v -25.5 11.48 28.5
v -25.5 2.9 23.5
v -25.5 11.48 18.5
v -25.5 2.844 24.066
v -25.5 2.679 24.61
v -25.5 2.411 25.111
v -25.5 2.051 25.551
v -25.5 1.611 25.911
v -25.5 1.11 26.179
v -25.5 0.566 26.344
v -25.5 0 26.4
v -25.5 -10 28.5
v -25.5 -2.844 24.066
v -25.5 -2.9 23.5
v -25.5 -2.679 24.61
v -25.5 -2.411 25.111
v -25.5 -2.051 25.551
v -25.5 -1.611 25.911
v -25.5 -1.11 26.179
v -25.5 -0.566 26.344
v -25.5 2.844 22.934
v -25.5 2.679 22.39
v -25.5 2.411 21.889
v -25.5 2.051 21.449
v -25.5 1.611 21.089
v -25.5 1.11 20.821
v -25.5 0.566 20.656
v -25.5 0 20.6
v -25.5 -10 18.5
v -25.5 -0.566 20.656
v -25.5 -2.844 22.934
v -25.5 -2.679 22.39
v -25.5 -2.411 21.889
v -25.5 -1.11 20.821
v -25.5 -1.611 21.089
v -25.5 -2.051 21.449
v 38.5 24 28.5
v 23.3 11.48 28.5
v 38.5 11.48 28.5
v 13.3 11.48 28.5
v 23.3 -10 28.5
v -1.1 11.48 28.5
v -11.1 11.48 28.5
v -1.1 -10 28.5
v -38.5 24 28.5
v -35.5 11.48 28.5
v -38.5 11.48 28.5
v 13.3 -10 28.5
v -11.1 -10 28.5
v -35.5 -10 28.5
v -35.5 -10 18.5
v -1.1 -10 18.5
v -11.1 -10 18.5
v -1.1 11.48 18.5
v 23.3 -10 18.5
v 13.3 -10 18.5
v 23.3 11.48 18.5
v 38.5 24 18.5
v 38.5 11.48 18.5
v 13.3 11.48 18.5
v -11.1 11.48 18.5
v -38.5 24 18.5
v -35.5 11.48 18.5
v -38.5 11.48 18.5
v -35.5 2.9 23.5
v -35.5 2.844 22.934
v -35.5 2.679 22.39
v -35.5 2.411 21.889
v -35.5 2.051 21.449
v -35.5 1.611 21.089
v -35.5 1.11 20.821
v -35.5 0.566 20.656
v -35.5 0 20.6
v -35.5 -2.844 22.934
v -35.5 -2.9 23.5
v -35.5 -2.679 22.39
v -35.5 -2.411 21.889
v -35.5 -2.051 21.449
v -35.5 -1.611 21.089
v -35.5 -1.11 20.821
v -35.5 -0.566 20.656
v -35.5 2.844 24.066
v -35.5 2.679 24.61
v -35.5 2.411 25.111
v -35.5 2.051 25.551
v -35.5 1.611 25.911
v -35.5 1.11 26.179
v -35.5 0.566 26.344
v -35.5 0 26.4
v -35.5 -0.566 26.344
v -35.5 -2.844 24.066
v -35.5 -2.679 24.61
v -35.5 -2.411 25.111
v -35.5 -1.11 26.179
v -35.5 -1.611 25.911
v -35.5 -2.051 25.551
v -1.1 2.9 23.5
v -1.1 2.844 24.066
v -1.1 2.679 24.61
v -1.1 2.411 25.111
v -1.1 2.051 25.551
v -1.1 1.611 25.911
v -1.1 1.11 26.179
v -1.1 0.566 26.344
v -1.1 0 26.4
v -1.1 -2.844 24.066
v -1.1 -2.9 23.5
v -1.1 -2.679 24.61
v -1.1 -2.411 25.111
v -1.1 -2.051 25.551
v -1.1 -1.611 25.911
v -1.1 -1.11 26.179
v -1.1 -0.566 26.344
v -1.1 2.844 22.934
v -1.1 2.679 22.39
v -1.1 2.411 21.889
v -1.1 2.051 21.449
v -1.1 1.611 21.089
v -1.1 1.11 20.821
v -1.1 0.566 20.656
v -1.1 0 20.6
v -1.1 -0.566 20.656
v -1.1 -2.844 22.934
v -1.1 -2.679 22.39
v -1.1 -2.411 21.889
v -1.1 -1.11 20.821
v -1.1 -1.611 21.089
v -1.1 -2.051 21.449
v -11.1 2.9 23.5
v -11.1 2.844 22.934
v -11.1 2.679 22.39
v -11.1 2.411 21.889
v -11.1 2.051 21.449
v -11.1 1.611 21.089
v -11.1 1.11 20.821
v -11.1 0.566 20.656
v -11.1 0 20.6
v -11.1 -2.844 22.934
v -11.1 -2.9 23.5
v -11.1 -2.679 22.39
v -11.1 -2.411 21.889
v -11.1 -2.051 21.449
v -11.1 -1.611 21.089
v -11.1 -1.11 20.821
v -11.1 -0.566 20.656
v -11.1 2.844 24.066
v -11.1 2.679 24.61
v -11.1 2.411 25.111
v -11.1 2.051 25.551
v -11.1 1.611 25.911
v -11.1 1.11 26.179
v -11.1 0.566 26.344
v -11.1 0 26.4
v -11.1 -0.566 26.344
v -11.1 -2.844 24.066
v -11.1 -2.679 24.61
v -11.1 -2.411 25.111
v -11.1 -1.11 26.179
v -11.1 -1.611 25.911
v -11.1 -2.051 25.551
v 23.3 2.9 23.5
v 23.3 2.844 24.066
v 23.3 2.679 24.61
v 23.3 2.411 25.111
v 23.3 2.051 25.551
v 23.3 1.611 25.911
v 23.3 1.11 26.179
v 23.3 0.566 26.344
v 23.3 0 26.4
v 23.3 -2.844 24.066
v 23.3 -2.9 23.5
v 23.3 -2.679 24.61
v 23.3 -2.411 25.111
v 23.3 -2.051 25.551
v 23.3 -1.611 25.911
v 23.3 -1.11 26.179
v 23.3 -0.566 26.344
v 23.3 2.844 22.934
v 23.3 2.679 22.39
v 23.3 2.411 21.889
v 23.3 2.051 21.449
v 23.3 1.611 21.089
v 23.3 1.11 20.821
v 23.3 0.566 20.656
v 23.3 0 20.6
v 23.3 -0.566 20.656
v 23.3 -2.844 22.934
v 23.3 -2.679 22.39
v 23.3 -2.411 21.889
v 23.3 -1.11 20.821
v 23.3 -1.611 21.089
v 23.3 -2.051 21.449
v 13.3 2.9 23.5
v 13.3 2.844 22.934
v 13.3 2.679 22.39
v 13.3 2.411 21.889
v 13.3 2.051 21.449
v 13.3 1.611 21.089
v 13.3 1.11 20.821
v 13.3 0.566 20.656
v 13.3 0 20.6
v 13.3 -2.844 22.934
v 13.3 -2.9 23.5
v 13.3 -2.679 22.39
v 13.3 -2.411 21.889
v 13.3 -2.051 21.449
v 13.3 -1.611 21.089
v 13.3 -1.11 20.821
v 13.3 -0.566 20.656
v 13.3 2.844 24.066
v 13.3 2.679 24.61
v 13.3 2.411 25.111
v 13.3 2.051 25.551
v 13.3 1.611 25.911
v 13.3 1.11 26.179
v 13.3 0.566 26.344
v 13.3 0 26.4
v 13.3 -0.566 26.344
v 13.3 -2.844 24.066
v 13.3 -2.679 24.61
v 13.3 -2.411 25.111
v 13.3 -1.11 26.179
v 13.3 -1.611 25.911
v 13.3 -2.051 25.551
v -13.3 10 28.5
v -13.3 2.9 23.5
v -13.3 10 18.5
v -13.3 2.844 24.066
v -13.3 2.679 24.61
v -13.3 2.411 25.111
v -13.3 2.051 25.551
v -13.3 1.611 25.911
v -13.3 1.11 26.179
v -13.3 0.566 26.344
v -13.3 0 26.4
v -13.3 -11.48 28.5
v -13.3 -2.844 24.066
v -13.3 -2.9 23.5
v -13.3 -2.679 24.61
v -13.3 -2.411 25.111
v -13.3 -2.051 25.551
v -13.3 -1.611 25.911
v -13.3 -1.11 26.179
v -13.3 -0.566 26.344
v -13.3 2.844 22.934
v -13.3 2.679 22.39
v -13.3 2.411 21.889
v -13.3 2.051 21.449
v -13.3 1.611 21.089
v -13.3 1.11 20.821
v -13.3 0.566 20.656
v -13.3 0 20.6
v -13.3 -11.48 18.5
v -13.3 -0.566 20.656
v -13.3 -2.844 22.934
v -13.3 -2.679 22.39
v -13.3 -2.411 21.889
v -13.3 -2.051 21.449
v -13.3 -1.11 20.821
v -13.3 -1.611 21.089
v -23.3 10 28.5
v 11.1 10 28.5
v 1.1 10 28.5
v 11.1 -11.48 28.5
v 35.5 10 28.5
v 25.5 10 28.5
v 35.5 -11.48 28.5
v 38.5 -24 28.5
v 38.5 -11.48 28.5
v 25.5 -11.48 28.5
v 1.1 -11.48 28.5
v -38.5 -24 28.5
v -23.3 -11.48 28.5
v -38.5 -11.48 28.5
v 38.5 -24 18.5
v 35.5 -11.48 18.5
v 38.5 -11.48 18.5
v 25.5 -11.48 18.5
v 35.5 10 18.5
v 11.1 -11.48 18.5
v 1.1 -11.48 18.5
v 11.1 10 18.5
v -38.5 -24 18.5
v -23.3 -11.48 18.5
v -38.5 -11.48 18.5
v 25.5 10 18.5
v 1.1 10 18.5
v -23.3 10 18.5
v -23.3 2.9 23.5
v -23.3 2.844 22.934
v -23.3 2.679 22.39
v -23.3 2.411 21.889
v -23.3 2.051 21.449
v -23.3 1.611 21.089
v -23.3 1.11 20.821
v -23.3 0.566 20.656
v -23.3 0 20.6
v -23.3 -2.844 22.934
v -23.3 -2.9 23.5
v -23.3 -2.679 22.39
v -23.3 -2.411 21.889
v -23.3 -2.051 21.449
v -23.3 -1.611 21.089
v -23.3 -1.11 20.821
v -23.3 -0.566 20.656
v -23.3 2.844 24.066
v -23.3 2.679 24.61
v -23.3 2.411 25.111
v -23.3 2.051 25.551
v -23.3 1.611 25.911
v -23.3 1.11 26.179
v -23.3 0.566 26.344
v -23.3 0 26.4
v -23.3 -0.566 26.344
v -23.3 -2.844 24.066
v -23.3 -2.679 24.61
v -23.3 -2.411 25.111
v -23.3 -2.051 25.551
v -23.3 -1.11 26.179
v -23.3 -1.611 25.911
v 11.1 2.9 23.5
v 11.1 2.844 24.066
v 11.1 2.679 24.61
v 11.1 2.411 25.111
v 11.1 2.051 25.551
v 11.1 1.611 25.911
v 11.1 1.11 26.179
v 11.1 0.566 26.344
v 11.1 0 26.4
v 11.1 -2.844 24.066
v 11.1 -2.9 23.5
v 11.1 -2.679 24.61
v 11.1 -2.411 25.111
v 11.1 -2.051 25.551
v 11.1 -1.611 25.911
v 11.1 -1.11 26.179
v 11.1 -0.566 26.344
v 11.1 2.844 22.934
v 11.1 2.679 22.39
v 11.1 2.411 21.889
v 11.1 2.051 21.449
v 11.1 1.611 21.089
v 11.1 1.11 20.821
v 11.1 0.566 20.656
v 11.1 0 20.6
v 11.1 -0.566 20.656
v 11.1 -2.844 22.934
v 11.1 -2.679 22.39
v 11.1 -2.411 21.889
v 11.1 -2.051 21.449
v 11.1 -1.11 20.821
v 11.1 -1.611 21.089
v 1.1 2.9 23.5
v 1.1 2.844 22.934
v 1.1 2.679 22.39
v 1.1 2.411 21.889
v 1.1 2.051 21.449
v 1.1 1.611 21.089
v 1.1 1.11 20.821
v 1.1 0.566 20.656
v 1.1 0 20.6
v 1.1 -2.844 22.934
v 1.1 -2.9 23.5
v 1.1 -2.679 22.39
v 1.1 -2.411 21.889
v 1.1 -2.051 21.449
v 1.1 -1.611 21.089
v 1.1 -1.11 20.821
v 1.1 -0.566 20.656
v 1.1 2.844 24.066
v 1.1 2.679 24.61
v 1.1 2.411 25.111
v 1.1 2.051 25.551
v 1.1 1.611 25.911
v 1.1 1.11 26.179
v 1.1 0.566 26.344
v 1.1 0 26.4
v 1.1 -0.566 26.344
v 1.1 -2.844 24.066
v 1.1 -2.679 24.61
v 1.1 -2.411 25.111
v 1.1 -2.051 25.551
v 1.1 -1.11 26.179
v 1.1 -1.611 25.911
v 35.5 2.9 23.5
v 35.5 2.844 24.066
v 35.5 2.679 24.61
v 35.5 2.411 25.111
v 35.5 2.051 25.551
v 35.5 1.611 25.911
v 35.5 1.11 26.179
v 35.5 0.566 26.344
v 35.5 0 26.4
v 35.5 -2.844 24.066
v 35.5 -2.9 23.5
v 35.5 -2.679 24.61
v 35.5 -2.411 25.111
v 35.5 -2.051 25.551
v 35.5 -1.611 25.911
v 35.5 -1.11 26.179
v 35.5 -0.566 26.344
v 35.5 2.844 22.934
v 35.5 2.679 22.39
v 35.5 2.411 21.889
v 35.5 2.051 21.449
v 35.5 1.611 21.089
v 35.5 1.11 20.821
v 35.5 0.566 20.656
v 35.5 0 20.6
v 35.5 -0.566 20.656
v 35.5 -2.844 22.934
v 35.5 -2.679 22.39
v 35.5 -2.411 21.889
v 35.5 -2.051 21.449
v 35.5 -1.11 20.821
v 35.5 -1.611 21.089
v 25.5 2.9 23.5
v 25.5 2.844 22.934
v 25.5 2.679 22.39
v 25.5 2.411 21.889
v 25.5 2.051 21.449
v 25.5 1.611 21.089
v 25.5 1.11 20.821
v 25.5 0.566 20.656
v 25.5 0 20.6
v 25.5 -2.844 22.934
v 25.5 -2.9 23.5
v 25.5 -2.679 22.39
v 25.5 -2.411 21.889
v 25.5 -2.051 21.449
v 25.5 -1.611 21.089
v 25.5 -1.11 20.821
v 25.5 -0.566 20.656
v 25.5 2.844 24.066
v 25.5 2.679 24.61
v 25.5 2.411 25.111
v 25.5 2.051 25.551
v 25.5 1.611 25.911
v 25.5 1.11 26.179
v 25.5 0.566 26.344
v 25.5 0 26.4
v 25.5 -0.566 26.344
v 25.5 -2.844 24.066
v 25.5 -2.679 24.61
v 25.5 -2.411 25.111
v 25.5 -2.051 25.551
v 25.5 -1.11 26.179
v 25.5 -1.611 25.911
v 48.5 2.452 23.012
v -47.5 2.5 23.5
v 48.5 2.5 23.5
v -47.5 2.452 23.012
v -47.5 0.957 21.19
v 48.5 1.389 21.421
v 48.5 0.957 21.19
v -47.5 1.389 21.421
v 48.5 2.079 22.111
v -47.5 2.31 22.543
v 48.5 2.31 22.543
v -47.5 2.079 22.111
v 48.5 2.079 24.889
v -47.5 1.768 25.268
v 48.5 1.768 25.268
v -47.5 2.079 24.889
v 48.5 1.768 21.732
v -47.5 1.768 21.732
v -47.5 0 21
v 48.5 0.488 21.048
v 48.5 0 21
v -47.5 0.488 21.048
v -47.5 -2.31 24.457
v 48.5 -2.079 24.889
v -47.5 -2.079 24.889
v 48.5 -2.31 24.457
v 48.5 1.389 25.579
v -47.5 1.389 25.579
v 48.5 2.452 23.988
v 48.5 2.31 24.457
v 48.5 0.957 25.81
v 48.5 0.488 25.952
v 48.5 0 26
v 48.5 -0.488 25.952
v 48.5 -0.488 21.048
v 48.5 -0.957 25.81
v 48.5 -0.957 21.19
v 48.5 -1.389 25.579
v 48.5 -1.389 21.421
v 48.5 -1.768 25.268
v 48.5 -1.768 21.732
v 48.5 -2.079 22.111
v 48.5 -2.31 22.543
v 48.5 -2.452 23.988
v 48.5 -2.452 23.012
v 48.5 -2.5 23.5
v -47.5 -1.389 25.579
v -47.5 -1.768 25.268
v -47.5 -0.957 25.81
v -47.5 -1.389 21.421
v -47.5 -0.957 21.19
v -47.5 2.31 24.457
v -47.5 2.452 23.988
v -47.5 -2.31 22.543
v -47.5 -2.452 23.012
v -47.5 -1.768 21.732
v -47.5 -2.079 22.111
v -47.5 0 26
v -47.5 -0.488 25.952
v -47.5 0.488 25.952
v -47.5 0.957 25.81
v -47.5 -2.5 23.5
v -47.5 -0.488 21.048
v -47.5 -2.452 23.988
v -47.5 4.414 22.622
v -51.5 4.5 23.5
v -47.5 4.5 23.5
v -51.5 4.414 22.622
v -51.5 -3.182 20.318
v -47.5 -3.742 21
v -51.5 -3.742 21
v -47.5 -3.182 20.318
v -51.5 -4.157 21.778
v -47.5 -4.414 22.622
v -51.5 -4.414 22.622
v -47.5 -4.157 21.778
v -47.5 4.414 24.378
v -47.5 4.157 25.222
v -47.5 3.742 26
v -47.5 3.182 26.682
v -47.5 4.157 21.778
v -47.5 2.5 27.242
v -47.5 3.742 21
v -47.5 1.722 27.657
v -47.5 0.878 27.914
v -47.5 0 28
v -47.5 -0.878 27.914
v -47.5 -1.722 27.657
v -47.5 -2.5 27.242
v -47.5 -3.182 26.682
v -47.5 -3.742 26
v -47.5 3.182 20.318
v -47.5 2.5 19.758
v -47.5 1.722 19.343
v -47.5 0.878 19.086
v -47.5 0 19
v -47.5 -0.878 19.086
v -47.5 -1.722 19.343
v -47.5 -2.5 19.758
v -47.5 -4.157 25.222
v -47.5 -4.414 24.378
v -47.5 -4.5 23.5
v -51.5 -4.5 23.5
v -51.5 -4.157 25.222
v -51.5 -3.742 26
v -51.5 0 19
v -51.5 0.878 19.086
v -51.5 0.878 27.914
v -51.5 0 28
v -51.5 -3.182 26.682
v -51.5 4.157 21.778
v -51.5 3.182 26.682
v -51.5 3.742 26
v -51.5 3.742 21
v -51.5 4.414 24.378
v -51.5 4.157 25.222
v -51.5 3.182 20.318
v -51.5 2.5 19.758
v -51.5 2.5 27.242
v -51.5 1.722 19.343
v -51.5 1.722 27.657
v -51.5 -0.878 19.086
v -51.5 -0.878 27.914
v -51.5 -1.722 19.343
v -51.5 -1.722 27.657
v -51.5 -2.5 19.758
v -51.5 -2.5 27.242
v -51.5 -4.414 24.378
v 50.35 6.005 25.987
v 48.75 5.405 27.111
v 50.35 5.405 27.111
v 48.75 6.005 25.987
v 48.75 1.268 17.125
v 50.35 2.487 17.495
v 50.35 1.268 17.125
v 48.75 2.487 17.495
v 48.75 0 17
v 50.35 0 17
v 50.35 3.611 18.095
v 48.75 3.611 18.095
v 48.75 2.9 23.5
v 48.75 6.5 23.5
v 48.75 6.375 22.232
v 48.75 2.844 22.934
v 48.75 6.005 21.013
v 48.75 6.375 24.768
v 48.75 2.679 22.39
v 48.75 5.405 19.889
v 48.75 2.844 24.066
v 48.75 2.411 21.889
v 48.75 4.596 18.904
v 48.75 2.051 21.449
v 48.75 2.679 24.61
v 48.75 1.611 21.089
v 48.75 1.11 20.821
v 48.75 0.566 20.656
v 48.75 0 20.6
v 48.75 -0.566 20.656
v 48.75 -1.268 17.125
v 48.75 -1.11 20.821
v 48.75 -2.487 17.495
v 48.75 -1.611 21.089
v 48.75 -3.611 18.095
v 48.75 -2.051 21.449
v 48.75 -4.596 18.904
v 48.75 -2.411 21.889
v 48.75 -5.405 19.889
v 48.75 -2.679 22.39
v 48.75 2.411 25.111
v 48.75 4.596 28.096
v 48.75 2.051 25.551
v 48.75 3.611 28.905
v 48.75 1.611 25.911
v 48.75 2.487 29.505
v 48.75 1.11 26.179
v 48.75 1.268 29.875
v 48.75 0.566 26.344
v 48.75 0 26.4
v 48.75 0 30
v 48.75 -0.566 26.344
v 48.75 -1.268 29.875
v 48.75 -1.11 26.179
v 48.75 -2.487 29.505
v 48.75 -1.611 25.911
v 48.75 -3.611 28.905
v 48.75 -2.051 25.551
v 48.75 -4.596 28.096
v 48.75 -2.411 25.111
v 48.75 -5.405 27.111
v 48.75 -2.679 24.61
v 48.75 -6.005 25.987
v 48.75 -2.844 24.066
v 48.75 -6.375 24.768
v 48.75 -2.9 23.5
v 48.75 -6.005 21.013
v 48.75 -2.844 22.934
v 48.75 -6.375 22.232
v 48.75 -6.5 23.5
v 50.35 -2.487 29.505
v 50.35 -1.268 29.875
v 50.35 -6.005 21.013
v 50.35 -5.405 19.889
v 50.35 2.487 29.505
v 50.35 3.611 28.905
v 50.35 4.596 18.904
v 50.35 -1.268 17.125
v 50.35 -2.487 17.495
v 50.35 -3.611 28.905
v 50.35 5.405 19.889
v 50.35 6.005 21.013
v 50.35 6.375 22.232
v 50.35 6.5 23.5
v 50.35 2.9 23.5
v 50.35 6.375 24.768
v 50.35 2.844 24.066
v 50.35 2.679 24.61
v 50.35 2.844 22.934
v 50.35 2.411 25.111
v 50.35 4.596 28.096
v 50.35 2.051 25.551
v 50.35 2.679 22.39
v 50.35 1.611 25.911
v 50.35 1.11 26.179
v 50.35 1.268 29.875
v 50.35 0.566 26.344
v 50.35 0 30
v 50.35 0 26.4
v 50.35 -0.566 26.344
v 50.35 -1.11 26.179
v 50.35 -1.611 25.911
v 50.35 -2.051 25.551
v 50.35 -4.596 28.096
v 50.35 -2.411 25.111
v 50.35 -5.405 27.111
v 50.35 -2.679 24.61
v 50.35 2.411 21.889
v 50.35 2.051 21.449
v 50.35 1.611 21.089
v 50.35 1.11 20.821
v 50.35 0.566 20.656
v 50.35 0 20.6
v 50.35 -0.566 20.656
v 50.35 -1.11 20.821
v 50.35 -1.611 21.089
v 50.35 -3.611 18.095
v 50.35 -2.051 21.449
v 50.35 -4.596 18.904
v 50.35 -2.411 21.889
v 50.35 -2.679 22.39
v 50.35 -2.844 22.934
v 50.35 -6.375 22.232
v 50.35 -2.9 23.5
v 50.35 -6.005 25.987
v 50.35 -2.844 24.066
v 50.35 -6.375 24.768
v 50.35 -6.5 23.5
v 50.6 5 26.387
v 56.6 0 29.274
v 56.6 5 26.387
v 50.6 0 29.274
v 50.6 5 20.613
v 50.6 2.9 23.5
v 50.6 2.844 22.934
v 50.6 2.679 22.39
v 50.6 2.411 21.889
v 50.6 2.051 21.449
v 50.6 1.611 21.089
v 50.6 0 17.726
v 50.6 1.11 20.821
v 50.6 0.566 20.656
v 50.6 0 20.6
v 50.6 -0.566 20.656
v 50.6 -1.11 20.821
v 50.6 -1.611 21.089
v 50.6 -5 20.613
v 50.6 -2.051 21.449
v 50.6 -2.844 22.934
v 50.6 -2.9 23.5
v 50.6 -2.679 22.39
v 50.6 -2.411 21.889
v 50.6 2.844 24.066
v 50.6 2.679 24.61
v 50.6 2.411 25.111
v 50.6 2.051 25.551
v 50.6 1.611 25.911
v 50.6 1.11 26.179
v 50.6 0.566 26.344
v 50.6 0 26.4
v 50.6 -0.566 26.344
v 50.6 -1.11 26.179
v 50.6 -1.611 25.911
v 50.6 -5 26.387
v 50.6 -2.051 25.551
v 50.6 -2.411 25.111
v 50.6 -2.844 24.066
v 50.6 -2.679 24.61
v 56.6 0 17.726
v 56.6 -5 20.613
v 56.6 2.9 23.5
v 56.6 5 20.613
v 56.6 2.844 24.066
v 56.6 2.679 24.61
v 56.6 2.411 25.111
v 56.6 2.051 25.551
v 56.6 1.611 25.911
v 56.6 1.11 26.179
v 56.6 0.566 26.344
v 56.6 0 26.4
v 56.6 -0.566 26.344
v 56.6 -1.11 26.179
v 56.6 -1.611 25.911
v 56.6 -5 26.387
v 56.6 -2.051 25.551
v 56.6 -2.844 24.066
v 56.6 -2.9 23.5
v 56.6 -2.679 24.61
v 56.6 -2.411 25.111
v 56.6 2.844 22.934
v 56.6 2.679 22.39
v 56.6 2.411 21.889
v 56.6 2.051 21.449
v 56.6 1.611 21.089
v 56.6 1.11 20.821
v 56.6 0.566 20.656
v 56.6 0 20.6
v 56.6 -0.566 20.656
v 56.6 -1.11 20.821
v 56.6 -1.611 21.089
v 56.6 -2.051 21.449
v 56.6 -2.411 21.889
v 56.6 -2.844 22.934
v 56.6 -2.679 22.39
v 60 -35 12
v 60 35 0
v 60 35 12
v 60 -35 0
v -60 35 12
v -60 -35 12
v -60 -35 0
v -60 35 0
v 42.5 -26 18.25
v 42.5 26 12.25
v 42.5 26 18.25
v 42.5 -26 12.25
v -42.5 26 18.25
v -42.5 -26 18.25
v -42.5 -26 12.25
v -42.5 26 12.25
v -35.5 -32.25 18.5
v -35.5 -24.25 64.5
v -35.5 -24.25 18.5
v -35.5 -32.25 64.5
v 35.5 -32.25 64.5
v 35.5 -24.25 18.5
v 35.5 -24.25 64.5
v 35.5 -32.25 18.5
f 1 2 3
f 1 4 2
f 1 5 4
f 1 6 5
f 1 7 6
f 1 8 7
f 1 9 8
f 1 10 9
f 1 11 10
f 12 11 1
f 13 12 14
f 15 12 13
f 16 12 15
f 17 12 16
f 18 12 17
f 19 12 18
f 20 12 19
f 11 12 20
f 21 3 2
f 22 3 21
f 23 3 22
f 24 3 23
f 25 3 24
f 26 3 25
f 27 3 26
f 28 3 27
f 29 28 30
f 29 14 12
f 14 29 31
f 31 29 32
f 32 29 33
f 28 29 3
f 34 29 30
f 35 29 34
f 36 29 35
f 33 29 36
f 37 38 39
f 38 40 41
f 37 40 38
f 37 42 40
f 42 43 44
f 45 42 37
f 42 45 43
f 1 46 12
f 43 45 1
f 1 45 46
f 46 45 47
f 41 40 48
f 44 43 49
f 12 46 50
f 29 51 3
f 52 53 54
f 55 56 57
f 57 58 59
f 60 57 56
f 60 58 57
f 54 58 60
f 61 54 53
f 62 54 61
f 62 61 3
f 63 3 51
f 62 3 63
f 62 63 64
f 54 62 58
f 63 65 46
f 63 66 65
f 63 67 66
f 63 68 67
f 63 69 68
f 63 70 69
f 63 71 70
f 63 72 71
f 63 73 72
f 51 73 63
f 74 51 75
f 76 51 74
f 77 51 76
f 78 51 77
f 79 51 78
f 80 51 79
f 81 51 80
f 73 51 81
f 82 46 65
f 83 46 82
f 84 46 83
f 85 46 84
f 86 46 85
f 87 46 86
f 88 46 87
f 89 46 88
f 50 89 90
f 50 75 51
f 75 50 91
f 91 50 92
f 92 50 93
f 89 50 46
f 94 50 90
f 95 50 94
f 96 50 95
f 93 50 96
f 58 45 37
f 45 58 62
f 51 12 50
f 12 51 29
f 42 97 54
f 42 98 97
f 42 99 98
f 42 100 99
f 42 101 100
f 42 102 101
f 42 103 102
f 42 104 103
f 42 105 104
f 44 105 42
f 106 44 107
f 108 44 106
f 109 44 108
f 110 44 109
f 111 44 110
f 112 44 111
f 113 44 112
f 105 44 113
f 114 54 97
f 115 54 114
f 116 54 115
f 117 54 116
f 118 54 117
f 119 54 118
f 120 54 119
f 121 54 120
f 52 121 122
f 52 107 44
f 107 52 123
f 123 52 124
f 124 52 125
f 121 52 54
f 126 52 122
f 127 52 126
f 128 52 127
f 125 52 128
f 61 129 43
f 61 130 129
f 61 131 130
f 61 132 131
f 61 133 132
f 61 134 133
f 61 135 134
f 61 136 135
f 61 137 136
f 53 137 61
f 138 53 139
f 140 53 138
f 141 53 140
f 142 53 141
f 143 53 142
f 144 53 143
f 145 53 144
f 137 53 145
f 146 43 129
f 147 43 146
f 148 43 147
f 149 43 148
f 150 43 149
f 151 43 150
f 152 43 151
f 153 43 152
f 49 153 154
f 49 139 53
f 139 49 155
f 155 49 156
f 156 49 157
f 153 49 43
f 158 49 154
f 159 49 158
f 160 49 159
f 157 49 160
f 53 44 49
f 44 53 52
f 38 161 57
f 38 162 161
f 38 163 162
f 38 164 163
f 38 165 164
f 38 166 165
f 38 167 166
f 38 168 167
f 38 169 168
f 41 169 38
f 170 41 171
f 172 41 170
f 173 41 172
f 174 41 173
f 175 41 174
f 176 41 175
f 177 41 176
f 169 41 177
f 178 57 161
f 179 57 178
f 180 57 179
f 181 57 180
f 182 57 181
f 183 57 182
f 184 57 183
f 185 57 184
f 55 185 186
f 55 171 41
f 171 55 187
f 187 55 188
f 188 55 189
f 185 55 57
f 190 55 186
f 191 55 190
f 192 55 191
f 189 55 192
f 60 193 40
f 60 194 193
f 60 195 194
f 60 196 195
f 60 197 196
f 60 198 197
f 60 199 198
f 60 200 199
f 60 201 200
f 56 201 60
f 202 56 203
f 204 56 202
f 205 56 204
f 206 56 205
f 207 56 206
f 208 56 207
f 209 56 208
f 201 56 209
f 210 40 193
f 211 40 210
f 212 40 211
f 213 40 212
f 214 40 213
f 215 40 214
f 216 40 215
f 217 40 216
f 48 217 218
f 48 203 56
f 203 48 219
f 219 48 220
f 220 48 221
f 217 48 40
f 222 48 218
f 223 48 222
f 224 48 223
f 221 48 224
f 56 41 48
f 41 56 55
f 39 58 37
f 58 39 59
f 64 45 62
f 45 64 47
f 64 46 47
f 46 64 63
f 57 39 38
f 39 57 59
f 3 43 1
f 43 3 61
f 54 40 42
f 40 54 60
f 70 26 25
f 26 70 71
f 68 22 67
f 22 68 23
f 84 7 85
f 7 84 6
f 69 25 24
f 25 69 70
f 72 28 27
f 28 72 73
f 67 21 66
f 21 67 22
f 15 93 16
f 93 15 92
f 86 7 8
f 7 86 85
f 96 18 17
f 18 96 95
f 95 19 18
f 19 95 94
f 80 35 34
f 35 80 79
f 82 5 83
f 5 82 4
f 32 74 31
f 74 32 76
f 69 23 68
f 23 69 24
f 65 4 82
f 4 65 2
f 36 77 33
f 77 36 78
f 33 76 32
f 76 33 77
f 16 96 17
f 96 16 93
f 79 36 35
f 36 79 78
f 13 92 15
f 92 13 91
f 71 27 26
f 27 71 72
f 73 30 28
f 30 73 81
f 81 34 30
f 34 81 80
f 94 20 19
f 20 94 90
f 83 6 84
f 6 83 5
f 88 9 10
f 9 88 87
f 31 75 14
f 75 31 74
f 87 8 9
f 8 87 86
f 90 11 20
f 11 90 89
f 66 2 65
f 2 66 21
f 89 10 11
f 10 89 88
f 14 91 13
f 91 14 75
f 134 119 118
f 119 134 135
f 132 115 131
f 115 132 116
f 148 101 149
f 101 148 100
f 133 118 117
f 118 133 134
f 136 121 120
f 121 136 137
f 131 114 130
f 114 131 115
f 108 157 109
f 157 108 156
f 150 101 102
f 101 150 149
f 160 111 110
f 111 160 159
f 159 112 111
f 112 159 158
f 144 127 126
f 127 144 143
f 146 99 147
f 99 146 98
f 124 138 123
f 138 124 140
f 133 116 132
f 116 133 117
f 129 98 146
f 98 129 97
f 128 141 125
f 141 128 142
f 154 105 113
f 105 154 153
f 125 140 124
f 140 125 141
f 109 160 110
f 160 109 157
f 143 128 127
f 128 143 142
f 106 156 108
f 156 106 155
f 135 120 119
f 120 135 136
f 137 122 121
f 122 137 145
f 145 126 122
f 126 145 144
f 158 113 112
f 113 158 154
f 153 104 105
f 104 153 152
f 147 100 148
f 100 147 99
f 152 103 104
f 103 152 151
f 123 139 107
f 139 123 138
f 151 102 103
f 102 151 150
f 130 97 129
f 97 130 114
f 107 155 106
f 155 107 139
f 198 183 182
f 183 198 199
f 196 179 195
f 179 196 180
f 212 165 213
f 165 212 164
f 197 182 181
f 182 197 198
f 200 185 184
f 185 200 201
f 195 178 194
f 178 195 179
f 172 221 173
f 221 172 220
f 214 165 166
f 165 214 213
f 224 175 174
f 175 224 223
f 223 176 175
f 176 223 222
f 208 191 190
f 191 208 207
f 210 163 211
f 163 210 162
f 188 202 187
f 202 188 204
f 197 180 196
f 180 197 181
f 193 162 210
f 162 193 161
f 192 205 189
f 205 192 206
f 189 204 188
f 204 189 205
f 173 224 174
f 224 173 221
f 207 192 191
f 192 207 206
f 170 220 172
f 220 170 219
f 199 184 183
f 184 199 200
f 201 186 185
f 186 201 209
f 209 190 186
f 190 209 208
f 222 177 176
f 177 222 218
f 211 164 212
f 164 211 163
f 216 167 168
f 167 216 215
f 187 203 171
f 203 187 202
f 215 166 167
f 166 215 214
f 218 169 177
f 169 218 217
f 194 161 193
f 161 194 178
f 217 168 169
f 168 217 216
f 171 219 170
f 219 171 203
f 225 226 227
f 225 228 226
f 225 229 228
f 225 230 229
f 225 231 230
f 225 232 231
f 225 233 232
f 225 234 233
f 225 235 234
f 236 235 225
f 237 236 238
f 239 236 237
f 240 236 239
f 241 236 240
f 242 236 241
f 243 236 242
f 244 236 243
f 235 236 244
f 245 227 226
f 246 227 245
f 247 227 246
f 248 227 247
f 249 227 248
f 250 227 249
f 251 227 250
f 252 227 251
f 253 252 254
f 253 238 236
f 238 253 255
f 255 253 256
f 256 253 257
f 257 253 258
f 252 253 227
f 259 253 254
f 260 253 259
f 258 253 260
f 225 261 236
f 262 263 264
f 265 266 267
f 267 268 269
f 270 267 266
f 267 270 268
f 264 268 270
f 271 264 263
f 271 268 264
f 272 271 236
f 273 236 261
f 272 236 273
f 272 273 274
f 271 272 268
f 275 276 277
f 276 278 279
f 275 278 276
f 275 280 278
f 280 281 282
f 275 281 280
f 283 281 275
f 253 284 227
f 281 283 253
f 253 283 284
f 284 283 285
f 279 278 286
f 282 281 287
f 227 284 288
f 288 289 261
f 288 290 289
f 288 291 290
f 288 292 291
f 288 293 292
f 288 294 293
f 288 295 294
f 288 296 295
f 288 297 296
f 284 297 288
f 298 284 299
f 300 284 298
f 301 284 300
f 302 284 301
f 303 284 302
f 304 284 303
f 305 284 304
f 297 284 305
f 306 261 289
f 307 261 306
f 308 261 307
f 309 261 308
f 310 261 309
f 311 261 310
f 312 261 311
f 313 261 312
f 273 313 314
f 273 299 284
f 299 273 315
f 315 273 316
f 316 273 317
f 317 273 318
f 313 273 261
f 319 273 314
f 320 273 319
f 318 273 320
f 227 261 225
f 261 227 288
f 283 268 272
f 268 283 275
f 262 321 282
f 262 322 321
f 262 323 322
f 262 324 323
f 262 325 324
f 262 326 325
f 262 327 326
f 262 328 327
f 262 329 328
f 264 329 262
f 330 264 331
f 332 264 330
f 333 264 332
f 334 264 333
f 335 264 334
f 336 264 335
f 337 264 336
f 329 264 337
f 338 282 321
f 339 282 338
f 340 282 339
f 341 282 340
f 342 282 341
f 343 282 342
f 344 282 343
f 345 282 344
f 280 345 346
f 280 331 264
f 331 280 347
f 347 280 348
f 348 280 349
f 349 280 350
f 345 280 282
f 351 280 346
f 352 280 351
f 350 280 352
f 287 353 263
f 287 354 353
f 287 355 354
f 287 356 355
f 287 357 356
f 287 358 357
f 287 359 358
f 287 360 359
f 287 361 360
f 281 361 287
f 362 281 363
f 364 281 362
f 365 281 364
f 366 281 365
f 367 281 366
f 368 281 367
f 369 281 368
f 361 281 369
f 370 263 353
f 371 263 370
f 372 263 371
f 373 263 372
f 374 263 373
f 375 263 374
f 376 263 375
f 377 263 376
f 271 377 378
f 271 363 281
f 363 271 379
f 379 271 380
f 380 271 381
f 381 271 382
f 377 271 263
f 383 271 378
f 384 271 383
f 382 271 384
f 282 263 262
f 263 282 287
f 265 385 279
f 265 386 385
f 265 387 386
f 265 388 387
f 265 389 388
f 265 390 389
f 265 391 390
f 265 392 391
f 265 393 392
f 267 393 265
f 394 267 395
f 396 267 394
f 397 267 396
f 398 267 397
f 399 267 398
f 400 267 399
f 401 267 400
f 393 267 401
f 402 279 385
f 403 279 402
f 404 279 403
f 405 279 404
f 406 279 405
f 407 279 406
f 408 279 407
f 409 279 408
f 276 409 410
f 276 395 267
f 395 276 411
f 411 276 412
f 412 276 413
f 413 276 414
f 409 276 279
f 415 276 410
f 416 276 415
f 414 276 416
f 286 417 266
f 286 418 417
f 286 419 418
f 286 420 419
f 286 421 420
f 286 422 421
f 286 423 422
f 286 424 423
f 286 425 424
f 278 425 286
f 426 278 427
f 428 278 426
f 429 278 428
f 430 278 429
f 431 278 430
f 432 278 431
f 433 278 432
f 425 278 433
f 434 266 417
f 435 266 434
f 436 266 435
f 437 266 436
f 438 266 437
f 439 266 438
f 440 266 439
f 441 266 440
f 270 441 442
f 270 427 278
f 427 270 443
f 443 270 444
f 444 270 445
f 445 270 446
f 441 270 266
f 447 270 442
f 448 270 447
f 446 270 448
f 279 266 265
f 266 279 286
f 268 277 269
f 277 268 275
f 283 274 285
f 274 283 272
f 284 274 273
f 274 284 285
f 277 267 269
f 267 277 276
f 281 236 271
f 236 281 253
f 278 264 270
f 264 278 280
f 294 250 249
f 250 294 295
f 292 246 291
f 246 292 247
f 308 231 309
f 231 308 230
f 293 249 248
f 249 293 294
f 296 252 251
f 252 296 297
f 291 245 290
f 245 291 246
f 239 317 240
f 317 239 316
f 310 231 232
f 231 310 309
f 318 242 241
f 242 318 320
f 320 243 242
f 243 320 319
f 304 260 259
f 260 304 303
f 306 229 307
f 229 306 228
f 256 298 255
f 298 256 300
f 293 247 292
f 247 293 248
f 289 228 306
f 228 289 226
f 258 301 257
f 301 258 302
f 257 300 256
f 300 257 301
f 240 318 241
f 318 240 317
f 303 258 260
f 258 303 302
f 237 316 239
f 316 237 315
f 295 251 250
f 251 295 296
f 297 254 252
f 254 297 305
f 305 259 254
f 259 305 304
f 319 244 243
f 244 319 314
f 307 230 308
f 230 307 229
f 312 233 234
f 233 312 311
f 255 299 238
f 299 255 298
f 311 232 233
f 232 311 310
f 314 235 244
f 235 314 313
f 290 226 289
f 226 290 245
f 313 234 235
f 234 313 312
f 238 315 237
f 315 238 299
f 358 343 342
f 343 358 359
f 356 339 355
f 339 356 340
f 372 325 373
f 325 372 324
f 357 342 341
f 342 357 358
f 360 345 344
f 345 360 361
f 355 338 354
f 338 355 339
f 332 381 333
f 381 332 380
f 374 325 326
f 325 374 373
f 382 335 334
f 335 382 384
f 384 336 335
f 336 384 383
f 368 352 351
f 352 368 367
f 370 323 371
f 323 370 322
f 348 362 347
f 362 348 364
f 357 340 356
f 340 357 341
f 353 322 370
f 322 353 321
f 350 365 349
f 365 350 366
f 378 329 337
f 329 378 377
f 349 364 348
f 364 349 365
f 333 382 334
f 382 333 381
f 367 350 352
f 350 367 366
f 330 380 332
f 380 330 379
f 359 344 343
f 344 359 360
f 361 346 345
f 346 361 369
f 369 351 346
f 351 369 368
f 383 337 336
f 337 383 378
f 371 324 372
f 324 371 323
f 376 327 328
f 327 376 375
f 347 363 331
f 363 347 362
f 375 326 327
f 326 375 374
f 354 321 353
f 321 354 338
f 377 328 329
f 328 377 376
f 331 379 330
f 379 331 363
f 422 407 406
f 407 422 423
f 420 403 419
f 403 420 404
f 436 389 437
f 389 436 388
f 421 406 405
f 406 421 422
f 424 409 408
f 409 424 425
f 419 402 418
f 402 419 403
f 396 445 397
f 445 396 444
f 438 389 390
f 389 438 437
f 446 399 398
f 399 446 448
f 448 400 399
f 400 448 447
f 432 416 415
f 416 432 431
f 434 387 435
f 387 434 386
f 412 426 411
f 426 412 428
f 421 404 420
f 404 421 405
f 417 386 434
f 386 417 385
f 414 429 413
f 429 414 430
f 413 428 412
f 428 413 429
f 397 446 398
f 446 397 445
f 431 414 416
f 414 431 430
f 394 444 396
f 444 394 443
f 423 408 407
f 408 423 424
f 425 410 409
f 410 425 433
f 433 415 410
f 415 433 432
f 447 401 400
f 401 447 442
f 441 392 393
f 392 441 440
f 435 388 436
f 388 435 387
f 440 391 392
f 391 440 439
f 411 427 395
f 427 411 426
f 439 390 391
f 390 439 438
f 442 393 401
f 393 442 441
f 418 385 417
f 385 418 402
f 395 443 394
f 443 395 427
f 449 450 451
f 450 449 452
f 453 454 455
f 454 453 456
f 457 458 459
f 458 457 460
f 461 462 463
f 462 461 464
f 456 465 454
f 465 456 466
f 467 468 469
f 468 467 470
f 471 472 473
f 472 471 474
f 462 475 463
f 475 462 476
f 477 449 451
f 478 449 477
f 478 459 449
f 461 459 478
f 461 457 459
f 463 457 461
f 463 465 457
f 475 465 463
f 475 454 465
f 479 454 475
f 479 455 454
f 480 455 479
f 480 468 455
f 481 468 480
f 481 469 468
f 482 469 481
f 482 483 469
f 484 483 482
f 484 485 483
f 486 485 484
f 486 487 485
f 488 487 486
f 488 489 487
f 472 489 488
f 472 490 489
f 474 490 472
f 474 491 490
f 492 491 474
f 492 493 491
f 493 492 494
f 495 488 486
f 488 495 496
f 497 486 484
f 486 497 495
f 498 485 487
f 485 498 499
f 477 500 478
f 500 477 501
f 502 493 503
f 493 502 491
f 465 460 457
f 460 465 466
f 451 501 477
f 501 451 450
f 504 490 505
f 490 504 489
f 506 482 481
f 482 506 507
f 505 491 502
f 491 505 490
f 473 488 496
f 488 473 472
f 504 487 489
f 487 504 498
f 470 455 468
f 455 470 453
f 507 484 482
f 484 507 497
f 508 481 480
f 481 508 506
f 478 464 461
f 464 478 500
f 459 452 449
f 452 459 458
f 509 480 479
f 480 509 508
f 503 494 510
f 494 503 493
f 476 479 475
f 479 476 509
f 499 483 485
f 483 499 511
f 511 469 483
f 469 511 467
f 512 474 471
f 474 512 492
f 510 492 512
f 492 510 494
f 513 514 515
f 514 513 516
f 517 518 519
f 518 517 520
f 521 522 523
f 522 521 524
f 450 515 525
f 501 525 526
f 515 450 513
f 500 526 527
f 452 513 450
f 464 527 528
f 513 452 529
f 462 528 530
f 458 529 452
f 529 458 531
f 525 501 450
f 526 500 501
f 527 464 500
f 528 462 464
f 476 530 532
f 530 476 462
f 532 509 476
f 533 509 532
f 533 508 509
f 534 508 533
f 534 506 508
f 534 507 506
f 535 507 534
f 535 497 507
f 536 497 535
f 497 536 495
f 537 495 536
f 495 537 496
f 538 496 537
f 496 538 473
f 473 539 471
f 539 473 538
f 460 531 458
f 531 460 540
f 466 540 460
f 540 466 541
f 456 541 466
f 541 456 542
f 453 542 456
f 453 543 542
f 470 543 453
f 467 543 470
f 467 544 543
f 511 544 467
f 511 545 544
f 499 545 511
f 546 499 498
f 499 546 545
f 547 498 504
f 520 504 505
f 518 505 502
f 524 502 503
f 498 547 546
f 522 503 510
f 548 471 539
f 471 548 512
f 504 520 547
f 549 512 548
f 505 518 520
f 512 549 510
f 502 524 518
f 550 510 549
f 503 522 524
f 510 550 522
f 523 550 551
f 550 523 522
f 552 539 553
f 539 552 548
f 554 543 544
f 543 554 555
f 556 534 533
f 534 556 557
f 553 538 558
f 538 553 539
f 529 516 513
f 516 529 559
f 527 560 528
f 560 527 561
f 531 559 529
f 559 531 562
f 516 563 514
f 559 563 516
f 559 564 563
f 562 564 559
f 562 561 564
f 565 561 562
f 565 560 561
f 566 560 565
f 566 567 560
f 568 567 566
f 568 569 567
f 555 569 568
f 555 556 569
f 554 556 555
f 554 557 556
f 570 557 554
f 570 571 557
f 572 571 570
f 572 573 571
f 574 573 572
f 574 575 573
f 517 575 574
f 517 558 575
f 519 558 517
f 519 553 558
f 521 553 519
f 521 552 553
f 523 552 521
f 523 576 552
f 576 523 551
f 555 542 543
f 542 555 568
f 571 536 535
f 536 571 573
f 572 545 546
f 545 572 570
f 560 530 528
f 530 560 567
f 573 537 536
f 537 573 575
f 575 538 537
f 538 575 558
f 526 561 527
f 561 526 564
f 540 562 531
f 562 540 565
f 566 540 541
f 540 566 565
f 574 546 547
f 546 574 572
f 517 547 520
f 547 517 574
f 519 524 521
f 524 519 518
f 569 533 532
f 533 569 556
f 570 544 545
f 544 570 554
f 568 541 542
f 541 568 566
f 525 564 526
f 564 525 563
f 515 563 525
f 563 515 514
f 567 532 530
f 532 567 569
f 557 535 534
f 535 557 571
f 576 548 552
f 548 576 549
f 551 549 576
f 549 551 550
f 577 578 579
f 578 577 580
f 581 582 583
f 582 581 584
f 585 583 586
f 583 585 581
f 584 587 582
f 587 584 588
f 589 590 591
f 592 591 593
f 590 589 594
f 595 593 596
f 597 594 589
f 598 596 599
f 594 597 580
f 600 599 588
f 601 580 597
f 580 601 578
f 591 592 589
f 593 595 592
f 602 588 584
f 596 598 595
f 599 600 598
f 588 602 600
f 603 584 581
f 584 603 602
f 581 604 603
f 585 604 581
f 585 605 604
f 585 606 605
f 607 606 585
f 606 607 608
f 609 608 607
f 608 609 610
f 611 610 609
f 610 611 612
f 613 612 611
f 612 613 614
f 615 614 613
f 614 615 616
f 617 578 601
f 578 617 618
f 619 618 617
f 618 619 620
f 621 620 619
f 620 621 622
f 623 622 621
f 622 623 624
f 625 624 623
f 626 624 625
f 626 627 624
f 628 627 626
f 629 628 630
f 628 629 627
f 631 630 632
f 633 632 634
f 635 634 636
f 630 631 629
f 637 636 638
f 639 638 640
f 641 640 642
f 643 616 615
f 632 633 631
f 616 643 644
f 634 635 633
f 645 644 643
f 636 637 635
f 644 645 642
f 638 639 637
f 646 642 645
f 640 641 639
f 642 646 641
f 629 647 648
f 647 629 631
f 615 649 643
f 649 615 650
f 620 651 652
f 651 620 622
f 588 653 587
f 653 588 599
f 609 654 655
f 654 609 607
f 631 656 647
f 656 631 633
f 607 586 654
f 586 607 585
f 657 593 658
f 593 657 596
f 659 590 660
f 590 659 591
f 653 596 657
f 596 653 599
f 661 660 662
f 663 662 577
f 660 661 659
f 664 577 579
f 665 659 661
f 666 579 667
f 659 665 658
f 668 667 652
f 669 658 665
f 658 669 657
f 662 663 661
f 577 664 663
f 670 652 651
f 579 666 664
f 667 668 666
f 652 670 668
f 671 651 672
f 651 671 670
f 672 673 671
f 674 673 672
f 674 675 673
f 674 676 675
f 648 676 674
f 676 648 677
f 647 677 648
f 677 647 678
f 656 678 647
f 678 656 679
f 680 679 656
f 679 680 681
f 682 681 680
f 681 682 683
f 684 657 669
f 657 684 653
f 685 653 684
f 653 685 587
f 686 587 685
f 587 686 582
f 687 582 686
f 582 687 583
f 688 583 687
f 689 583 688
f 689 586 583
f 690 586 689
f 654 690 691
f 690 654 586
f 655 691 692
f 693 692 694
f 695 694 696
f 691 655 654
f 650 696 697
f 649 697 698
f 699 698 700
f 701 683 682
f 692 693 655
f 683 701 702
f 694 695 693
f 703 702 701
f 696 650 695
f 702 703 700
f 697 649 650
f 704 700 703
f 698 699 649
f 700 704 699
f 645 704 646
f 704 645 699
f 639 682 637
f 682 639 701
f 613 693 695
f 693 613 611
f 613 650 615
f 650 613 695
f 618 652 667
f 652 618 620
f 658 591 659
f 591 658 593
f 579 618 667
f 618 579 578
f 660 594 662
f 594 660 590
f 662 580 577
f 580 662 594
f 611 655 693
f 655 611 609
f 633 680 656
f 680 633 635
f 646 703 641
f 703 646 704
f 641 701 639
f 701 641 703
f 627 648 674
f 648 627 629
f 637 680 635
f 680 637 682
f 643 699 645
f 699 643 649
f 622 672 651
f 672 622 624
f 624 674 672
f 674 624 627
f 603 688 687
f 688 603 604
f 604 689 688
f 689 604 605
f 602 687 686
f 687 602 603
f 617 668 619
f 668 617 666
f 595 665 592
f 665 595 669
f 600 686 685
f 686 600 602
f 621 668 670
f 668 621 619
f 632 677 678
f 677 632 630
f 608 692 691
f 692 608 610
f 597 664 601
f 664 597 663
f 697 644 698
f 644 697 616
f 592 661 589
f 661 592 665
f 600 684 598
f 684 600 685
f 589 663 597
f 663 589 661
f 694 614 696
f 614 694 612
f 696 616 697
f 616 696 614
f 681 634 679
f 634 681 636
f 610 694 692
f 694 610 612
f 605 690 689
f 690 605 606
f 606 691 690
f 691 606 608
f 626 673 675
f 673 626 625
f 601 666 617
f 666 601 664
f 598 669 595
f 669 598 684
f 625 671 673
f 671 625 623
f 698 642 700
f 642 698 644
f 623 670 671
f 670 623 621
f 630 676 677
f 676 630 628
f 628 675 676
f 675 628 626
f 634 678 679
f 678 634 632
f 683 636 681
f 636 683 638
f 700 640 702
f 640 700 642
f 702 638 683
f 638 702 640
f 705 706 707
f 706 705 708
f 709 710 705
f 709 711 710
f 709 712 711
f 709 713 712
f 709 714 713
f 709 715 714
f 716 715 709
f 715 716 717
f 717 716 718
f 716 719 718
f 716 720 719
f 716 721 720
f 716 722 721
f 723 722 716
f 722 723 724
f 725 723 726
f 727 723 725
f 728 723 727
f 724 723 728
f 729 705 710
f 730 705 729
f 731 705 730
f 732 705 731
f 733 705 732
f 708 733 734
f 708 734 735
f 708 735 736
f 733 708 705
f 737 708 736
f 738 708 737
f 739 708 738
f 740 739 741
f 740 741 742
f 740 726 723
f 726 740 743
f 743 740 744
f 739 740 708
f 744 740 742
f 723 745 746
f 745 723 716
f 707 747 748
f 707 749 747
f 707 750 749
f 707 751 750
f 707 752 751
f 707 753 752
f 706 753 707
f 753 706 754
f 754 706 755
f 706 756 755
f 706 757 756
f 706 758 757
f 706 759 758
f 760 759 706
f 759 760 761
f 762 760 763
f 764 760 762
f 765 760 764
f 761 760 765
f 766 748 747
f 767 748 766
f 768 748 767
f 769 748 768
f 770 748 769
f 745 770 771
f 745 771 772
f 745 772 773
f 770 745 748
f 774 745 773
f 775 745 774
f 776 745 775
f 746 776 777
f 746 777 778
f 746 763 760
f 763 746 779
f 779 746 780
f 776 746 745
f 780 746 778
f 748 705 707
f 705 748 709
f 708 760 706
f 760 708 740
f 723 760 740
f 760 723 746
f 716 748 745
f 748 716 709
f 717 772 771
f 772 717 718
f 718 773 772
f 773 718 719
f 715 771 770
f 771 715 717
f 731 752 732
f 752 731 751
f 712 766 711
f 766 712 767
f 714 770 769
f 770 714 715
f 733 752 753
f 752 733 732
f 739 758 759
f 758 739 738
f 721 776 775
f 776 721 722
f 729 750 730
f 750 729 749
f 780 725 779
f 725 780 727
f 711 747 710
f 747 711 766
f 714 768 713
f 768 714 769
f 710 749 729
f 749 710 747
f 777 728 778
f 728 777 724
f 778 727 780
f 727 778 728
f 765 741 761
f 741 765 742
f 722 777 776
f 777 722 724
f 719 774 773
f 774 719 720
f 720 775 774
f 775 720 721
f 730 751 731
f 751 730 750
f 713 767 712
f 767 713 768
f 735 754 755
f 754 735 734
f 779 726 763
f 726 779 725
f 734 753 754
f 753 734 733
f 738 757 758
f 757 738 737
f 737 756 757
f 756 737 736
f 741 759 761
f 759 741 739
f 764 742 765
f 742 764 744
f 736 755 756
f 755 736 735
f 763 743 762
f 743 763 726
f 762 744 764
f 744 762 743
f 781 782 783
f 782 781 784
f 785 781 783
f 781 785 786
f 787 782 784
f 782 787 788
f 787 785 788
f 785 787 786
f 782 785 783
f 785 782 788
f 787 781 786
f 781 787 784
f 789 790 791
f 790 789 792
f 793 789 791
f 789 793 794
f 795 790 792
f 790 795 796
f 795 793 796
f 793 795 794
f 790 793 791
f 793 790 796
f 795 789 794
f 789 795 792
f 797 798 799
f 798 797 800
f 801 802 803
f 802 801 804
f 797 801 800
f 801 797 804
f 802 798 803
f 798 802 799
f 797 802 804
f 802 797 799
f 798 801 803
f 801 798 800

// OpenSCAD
$fn = 32;

// ------------------------------------------------------------------------
// Comb hinge with flap: leaf 77 x 24 mm, pin d5, flap 46 mm
// Every part is its own module, assembly() places every instance.
// ------------------------------------------------------------------------

// --- part 1 ---
module hinge_bed() {
  difference() {
    translate([-60, -35, 0]) cube([120, 70, 12]);
  }
}

// --- part 2 ---
module hinge_riser() {
  difference() {
    translate([-42.5, -26, 0]) cube([85, 52, 6]);
  }
}

// --- part 3 ---
module hinge_leaf_a() {
  difference() {
    union() {
      translate([-35.5, -10, -5]) cube([10, 34, 10]);
      translate([-11.1, -10, -5]) cube([10, 34, 10]);
      translate([13.3, -10, -5]) cube([10, 34, 10]);
      translate([-38.5, 11.48, -5]) cube([77, 12.52, 10]);
    }
    translate([-30.5, 0, 0]) rotate([0, 90, 0]) cylinder(h = 12, d = 5.8, center = true);
    translate([-6.1, 0, 0]) rotate([0, 90, 0]) cylinder(h = 12, d = 5.8, center = true);
    translate([18.3, 0, 0]) rotate([0, 90, 0]) cylinder(h = 12, d = 5.8, center = true);
  }
}

// --- part 4 ---
module hinge_leaf_b() {
  difference() {
    union() {
      translate([-23.3, -24, -5]) cube([10, 34, 10]);
      translate([1.1, -24, -5]) cube([10, 34, 10]);
      translate([25.5, -24, -5]) cube([10, 34, 10]);
      translate([-38.5, -24, -5]) cube([77, 12.52, 10]);
    }
    translate([-18.3, 0, 0]) rotate([0, 90, 0]) cylinder(h = 12, d = 5.8, center = true);
    translate([6.1, 0, 0]) rotate([0, 90, 0]) cylinder(h = 12, d = 5.8, center = true);
    translate([30.5, 0, 0]) rotate([0, 90, 0]) cylinder(h = 12, d = 5.8, center = true);
  }
}

// --- part 5 ---
module hinge_flap() {
  difference() {
    translate([-35.5, -23, 0]) cube([71, 46, 8]);
  }
}

// --- part 6 ---
module hinge_pin() {
  rotate([0, 90, 0]) cylinder(h = 97, d = 5, center = true);
  translate([-51.5, 0, 0]) rotate([0, 90, 0]) cylinder(h = 4, d = 9);
}

// --- part 7 ---
module pin_washer() {
  difference() {
      translate([0, 0, 0]) cylinder(h = 1.6, d = 13);
      translate([0, 0, -1]) cylinder(h = 3.6, d = 5.8);
    }
}

// --- part 8 ---
module pin_nut() {
  difference() {
    linear_extrude(height = 6) polygon(points = [[5.774, 0], [2.887, 5], [-2.887, 5], [-5.774, 0], [-2.887, -5], [2.887, -5]]);
    translate([0, 0, -1]) cylinder(h = 8, d = 5.8);
  }
}

// --- assembly ---
module assembly() {
  color([0.80, 0.24, 0.20]) translate([0, 0, 0]) rotate([0, 0, 0]) hinge_bed();
  color([0.20, 0.45, 0.75]) translate([0, 0, 12.25]) rotate([0, 0, 0]) hinge_riser();
  color([0.25, 0.62, 0.32]) translate([0, 0, 23.5]) rotate([0, 0, 0]) hinge_leaf_a();
  color([0.92, 0.70, 0.18]) translate([0, 0, 23.5]) rotate([0, 0, 0]) hinge_leaf_b();
  color([0.58, 0.35, 0.70]) translate([0, -24.25, 41.5]) rotate([90, 0, 0]) hinge_flap();
  color([0.16, 0.66, 0.66]) translate([0, 0, 23.5]) rotate([0, 0, 0]) hinge_pin();
  color([0.85, 0.48, 0.18]) translate([48.75, 0, 23.5]) rotate([0, 90, 0]) pin_washer();
  color([0.55, 0.60, 0.65]) translate([50.6, 0, 23.5]) rotate([0, 90, 0]) pin_nut();
}

assembly();
